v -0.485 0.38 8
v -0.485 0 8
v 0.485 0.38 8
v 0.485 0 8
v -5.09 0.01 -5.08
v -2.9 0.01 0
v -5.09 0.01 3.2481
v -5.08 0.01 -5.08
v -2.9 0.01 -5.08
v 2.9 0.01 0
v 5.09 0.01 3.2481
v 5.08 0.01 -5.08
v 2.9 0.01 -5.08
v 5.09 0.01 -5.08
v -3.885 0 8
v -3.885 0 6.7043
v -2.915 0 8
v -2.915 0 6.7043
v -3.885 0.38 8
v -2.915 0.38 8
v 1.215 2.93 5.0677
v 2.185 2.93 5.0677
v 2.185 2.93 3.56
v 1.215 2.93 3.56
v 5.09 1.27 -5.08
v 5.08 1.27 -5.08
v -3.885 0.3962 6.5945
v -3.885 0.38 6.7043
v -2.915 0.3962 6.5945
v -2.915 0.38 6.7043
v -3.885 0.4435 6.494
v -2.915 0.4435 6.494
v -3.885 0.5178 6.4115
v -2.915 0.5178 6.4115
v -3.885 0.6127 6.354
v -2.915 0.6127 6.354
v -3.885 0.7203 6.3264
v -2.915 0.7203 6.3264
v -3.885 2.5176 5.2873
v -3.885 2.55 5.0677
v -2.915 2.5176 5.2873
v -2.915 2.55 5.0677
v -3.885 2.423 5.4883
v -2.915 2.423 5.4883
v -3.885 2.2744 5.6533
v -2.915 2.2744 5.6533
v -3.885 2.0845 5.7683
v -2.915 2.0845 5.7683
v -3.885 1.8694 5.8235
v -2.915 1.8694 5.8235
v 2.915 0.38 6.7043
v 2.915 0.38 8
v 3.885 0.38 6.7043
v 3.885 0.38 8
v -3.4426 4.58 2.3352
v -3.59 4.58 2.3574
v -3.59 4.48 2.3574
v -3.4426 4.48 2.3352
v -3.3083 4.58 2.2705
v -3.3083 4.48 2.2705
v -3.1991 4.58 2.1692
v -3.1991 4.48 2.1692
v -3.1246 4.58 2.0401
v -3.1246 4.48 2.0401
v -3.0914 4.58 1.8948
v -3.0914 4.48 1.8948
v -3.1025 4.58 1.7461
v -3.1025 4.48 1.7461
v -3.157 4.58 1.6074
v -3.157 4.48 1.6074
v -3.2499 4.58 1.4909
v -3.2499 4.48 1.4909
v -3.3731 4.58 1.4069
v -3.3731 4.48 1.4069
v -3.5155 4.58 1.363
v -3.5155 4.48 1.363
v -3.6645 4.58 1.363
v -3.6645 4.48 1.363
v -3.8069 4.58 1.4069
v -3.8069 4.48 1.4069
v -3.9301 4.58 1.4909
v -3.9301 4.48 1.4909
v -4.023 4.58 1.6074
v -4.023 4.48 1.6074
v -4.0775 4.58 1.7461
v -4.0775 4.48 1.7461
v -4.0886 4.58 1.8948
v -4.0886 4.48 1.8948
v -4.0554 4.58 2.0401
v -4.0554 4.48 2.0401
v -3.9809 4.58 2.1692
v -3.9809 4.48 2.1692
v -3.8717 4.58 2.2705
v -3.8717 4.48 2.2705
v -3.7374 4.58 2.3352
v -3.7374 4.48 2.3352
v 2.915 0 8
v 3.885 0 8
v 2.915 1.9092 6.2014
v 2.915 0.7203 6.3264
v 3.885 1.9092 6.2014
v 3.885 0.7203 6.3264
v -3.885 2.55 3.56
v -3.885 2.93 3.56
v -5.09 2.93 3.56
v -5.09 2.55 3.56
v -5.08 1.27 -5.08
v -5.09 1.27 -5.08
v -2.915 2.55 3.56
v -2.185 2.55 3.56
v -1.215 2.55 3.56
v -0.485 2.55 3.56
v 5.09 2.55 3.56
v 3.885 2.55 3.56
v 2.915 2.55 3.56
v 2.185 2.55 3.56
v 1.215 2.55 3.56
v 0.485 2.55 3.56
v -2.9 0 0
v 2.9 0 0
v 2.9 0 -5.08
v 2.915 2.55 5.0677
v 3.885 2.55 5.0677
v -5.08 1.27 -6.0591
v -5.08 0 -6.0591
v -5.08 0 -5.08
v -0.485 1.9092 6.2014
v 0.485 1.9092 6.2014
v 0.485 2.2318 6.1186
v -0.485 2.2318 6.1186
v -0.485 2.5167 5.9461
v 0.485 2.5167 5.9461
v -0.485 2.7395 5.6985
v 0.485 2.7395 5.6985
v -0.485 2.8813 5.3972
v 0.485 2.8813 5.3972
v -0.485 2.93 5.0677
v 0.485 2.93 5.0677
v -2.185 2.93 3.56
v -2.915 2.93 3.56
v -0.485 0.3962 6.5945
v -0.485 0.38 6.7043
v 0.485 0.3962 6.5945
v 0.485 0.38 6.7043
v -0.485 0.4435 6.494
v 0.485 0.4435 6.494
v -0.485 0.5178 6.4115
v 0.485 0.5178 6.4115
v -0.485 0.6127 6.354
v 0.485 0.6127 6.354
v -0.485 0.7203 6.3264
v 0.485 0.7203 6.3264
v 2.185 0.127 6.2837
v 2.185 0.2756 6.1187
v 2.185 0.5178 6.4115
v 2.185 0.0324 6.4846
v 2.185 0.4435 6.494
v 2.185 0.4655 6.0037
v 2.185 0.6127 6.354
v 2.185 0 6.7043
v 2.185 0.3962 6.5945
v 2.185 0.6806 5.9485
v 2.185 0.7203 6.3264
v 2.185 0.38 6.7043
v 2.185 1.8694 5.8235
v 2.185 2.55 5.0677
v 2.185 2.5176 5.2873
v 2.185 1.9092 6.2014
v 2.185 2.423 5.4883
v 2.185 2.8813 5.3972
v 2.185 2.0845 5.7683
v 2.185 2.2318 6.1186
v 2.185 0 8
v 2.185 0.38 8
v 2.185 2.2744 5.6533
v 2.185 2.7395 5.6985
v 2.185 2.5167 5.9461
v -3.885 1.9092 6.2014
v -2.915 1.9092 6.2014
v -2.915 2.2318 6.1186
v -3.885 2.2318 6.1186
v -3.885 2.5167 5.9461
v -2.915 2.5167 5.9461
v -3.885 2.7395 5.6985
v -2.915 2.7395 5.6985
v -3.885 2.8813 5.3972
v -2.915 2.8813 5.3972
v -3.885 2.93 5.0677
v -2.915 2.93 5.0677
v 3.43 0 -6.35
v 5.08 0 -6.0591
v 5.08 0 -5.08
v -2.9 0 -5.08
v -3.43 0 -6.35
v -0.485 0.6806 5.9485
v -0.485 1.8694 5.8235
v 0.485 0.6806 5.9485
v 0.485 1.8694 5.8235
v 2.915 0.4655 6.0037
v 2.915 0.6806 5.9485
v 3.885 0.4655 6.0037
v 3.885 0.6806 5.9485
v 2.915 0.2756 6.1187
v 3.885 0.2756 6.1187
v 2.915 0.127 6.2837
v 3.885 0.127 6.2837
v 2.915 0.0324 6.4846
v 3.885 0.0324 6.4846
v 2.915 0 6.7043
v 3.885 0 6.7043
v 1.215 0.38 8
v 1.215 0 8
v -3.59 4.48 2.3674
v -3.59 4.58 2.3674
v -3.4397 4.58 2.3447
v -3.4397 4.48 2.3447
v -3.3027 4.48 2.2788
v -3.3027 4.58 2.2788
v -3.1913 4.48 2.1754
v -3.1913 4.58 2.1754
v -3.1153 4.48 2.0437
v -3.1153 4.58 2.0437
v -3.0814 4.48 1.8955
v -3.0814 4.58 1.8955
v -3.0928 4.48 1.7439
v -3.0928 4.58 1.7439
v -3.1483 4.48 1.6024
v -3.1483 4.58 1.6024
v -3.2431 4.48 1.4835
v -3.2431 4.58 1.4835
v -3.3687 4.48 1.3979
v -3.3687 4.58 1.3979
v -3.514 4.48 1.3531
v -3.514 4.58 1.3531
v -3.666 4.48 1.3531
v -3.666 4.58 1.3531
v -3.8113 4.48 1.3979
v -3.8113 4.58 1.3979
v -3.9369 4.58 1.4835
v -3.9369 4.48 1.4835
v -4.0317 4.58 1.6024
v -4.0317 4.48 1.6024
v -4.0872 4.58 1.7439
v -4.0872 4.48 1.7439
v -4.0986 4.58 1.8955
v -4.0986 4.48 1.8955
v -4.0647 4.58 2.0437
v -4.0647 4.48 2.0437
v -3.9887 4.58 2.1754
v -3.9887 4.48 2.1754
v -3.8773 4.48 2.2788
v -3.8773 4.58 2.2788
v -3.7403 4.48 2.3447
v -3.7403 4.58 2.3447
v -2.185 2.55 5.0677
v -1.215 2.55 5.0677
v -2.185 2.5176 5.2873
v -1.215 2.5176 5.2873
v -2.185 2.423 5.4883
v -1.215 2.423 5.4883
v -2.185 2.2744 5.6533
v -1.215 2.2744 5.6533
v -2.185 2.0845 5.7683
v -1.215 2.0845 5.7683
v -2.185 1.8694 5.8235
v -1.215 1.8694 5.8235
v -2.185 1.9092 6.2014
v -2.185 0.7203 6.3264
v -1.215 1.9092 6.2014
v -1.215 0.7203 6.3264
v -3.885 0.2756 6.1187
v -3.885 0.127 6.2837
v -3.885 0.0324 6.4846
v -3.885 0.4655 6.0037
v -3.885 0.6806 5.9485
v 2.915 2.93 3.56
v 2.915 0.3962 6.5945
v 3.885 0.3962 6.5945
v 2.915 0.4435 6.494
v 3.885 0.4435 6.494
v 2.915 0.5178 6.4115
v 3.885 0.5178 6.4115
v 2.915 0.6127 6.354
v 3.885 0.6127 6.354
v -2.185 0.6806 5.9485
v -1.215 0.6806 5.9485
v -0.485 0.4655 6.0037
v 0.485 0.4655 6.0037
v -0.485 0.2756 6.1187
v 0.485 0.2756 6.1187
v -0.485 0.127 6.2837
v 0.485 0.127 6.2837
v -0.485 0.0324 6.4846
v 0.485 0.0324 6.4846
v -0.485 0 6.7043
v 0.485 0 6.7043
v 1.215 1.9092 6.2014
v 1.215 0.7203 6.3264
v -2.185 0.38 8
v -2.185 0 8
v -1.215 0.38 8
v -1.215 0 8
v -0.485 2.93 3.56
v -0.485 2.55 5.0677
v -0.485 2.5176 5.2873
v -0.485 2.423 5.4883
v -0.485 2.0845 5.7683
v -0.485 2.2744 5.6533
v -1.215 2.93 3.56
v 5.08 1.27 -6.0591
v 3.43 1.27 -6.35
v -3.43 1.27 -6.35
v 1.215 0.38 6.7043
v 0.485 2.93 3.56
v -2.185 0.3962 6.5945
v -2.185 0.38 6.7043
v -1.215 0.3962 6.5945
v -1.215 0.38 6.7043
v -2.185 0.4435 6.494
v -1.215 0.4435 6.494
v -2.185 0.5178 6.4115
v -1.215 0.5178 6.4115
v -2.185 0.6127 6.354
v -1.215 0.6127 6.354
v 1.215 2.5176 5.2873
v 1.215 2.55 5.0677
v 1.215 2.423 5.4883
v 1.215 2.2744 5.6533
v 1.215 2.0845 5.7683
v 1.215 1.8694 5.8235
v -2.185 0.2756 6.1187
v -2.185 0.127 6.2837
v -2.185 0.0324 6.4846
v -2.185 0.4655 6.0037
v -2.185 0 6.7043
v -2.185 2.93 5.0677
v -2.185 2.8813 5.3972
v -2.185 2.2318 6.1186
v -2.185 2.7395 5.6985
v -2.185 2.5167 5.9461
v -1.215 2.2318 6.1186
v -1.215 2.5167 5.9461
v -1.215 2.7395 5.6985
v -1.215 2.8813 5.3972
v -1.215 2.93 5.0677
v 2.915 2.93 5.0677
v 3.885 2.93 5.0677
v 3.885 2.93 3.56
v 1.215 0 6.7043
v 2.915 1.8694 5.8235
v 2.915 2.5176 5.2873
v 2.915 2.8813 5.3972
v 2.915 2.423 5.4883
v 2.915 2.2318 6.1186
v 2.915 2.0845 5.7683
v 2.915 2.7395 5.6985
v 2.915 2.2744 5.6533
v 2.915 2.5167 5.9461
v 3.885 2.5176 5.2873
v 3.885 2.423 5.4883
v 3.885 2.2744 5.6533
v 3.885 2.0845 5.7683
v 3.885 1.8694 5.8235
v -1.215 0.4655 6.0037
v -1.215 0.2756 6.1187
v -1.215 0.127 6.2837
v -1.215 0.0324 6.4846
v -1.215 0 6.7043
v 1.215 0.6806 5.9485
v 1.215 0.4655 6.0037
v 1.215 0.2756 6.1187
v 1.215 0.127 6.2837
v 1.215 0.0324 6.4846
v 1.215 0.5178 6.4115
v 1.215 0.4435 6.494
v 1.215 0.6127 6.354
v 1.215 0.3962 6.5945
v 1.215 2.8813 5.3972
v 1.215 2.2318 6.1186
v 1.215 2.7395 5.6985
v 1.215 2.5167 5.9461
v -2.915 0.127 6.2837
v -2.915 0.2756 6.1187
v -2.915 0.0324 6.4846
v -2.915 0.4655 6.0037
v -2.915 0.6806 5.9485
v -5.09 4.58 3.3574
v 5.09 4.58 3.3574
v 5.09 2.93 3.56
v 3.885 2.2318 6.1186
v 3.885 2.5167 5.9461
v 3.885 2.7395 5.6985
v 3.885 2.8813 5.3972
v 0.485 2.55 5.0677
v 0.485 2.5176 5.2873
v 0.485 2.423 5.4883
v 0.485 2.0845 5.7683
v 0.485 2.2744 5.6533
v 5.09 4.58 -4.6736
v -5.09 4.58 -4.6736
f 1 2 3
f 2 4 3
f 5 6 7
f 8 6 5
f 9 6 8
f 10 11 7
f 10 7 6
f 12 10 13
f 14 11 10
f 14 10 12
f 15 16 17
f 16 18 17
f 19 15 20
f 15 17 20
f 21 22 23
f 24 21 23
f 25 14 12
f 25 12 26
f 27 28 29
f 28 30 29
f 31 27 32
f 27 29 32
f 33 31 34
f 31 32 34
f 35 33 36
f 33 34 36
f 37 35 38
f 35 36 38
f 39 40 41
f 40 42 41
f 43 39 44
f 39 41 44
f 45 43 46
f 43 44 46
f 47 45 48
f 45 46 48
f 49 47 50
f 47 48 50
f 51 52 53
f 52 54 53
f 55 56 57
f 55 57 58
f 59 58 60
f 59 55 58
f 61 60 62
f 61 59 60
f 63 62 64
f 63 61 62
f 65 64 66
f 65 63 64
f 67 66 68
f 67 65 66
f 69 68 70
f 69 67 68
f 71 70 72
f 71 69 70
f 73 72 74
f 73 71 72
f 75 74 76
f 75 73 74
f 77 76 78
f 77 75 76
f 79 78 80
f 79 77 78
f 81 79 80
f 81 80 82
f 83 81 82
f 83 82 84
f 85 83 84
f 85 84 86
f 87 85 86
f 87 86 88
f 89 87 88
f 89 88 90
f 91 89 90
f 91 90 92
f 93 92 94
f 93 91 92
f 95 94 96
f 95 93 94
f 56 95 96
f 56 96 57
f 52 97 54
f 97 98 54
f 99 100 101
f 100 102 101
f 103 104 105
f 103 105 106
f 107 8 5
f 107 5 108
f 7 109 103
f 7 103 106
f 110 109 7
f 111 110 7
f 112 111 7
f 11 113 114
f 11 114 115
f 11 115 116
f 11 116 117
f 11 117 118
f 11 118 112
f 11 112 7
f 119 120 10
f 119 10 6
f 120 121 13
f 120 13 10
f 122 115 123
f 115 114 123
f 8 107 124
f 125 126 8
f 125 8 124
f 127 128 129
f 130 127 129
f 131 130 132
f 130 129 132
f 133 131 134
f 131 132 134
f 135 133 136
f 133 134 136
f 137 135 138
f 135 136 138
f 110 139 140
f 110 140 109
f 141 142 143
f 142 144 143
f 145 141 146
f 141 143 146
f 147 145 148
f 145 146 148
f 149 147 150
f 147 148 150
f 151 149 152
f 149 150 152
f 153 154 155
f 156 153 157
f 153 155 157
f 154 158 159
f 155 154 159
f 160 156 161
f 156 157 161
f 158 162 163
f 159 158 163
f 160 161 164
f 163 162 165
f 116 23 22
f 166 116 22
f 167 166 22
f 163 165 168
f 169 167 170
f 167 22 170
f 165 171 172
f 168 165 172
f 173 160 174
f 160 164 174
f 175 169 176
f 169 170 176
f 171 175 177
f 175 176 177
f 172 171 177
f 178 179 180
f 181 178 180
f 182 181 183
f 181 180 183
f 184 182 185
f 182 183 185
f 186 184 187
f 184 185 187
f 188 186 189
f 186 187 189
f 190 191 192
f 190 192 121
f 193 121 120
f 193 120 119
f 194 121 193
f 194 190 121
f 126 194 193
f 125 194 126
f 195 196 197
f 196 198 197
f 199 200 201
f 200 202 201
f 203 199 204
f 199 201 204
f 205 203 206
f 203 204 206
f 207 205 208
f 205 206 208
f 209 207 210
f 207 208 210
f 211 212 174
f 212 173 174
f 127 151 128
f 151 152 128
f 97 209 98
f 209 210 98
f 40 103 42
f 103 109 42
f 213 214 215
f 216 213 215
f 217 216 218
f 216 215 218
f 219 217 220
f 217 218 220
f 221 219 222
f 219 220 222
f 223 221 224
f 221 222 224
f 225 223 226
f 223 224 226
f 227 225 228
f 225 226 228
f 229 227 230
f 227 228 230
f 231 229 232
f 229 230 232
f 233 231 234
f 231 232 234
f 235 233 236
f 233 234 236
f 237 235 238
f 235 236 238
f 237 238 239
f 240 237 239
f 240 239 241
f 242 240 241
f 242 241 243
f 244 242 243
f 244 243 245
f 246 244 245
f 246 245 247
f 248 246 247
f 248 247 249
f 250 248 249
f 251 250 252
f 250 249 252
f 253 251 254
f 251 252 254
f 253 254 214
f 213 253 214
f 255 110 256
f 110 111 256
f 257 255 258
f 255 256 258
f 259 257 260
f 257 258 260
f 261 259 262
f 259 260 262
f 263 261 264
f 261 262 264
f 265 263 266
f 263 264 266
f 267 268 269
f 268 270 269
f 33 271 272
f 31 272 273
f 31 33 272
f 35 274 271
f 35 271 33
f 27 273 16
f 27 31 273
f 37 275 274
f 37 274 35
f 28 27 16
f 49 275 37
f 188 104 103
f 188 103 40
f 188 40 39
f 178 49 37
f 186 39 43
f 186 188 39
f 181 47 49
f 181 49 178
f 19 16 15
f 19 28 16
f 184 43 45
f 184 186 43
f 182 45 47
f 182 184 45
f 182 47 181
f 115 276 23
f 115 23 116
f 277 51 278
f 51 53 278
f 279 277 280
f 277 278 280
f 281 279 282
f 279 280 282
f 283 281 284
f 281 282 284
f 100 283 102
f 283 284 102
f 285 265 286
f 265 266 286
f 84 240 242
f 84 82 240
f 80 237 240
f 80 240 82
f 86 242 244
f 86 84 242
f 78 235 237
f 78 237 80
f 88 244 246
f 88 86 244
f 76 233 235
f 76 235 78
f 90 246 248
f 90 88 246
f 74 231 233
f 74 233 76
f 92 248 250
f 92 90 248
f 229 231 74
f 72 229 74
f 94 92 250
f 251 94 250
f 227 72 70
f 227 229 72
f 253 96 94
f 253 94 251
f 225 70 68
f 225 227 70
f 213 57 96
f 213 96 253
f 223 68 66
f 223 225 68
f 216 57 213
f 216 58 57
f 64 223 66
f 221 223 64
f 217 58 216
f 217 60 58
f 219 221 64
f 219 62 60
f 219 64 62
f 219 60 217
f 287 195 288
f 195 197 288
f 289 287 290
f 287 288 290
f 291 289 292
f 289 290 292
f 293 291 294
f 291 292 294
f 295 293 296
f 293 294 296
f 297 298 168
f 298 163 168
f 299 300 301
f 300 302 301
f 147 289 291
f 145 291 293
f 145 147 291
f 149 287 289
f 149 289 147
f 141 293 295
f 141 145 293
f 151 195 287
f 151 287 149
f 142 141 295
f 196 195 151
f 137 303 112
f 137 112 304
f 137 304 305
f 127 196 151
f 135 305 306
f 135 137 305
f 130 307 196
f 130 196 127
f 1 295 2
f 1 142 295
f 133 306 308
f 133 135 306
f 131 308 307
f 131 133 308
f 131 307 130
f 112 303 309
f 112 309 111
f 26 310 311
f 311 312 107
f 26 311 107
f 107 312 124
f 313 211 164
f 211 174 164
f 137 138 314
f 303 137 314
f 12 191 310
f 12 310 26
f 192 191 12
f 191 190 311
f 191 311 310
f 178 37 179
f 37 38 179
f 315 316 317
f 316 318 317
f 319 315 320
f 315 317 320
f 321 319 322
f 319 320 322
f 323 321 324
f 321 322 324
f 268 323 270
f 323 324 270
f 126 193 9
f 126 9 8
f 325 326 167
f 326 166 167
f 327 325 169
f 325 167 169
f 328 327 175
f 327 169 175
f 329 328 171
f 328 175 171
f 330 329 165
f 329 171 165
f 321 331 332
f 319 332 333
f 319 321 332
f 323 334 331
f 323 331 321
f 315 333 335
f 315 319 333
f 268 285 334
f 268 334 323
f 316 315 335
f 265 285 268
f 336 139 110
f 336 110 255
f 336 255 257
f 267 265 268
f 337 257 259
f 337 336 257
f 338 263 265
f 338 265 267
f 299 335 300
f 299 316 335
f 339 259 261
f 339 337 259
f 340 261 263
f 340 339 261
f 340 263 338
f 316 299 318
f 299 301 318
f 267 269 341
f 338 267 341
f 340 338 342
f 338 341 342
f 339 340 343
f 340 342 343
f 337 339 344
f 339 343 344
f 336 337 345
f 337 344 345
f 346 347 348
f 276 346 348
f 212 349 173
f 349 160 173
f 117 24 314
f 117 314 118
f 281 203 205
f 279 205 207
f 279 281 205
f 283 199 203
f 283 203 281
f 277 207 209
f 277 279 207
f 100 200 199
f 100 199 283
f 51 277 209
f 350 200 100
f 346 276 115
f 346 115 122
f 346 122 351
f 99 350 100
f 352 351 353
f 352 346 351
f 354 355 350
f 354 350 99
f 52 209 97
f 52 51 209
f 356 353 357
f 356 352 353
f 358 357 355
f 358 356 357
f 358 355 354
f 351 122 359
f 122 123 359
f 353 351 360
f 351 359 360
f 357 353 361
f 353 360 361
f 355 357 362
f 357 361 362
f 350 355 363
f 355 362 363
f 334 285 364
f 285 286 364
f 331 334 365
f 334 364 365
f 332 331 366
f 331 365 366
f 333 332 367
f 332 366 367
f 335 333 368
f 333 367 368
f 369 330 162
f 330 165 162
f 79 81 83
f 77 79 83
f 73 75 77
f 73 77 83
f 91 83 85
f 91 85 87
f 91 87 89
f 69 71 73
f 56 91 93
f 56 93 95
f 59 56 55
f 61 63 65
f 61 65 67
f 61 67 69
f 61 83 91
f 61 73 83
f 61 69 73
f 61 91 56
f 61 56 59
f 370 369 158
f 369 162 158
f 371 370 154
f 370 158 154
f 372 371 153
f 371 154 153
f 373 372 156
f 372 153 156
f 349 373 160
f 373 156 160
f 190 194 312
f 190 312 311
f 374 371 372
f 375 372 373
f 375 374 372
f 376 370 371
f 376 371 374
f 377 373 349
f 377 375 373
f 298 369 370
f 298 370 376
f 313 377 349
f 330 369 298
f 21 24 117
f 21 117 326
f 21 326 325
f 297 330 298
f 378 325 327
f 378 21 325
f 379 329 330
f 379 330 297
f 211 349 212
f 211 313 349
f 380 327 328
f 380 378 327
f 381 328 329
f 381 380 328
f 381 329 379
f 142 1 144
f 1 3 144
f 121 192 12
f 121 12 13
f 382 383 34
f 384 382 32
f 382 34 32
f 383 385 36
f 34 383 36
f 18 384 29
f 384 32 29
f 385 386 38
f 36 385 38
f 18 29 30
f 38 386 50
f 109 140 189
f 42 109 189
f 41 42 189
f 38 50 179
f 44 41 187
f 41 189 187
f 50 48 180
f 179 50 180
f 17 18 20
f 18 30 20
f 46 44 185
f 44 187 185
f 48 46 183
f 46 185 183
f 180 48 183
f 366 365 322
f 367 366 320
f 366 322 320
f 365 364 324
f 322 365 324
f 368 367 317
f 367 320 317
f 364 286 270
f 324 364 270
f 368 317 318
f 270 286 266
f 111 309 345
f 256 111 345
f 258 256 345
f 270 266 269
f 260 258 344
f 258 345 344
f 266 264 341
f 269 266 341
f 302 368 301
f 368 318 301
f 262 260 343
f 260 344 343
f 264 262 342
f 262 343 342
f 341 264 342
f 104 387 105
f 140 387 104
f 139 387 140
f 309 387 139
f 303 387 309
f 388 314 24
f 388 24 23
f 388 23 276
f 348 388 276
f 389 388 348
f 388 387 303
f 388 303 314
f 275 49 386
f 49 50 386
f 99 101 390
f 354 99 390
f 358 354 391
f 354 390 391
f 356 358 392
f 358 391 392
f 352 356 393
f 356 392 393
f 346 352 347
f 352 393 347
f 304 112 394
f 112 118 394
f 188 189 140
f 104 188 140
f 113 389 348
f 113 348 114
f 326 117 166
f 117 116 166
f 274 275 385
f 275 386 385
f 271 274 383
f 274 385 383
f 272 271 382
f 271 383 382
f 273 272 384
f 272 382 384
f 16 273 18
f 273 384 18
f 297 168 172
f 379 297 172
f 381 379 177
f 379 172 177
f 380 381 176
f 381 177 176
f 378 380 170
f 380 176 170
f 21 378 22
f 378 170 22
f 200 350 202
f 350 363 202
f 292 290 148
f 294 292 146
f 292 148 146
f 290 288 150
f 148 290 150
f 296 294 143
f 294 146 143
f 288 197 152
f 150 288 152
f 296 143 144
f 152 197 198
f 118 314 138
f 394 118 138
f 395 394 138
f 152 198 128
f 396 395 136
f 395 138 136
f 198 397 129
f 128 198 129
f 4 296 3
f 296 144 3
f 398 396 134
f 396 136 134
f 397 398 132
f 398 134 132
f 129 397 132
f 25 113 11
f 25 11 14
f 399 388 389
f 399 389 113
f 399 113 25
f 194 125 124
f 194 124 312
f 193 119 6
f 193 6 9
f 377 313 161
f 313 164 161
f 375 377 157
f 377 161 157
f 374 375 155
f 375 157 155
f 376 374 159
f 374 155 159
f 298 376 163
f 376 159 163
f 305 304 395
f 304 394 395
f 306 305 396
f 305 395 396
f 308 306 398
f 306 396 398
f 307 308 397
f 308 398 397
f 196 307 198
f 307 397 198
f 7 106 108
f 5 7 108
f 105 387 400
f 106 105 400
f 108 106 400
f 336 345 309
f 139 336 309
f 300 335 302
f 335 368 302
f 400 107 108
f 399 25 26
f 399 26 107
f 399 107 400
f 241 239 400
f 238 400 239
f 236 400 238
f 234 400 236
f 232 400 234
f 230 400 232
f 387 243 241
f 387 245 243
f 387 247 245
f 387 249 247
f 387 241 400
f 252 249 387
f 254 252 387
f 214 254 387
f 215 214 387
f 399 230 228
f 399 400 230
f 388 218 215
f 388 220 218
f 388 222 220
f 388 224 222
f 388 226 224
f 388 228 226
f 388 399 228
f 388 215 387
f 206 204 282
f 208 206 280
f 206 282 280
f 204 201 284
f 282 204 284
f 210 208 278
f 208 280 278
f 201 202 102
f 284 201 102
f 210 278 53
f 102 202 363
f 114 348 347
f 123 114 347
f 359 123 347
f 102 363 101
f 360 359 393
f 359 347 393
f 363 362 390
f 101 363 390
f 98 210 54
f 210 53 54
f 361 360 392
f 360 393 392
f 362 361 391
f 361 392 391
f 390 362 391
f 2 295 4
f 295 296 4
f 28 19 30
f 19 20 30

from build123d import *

# Parameters (mm, degrees)
EXTRUDE_1_DEPTH            = 1.27
EXTRUDE_2_DEPTH            = 0.01
EXTRUDE_2_DEPTH_BACK       = 10.17
SKETCH_4_R                 = 0.51
SKETCH_4_R_2               = 0.5
CUT_EXTRUDE_1_DEPTH        = 0.1
EXTRUDE_3_DEPTH            = 0.485
PATTERN_LINEAR_1_COUNT     = 3
PATTERN_LINEAR_1_PITCH     = 1.7
PATTERN_LINEAR_1_COL_COUNT = 3
PATTERN_LINEAR_1_COL_PITCH = 1.7


with BuildPart() as part:
    # Эскиз2 → Бобышка-Вытянуть1 (new body)
    with BuildSketch(Plane(origin=(0, 0, 0), x_dir=(1, 0, 0), z_dir=(0, 1, 0))):
        Polygon((3.43, 6.35), (5.08, 6.059060482), (5.08, 5.08), (2.9, 5.08), (2.9, 0), (-2.9, 0), (-2.9, 5.08), (-5.08, 5.08), (-5.08, 6.059060482), (-3.43, 6.35), align=None)
    extrude(amount=EXTRUDE_1_DEPTH)

    # Эскиз3 → Бобышка-Вытянуть2 (add, two sides: drawn at the far end of the back side and taken through both)
    with BuildSketch(Plane.ZY.offset(5.08).offset(-EXTRUDE_2_DEPTH_BACK)):
        Polygon((-5.08, 0.01), (-5.08, 1.27), (-4.673583103, 4.58), (3.357405475, 4.58), (3.56, 2.93), (3.56, 2.55), (3.248127215, 0.01), align=None)
    extrude(amount=EXTRUDE_2_DEPTH + EXTRUDE_2_DEPTH_BACK)

    # Эскиз4 → Вырез-Вытянуть1 (cut)
    with BuildSketch(Plane(origin=(0, 4.58, 0), x_dir=(1, 0, 0), z_dir=(0, 1, 0))):
        with Locations(Location((-3.59, -1.857405475, 0), (0, 0, 270))):
            Circle(SKETCH_4_R)
        with Locations(Location((-3.59, -1.857405475, 0), (0, 0, 270))):
            Circle(SKETCH_4_R_2, mode=Mode.SUBTRACT)
    extrude(amount=-CUT_EXTRUDE_1_DEPTH, mode=Mode.SUBTRACT)

    # Эскиз5 → Бобышка-Вытянуть3 (add, symmetric)
    with BuildSketch(Plane(origin=(0, 0, 0), x_dir=(0, 0, -1), z_dir=(1, 0, 0))):
        with BuildLine():
            Line((-3.56, 2.93), (-3.56, 2.55))
            Line((-3.56, 2.55), (-5.067677126, 2.55))
            ThreePointArc((-5.067677126, 2.55), (-5.576216387, 2.354790067), (-5.823513767, 1.869441632))
            Line((-5.823513767, 1.869441632), (-5.948470433, 0.680558368))
            ThreePointArc((-5.948470433, 0.680558368), (-6.195767813, 0.195209933), (-6.704307074, 0))
            Line((-6.704307074, 0), (-8, 0))
            Line((-8, 0), (-8, 0.38))
            Line((-8, 0.38), (-6.704307074, 0.38))
            ThreePointArc((-6.704307074, 0.38), (-6.450037443, 0.477604966), (-6.326388753, 0.720279184))
            Line((-6.326388753, 0.720279184), (-6.201432087, 1.909162448))
            ThreePointArc((-6.201432087, 1.909162448), (-5.830486018, 2.637185101), (-5.067677126, 2.93))
            Line((-5.067677126, 2.93), (-3.56, 2.93))
        make_face()
    extrude_3 = extrude(amount=EXTRUDE_3_DEPTH, both=True)

    # Линейный массив1: Бобышка-Вытянуть3 ×3
    with Locations(*[(-i * PATTERN_LINEAR_1_PITCH, 0, 0) for i in range(1, PATTERN_LINEAR_1_COUNT)]):
        add(extrude_3)

    # Линейный массив1 col: Бобышка-Вытянуть3 ×3
    with Locations(*[(i * PATTERN_LINEAR_1_COL_PITCH, 0, 0) for i in range(1, PATTERN_LINEAR_1_COL_COUNT)]):
        add(extrude_3)


solid = part.part
